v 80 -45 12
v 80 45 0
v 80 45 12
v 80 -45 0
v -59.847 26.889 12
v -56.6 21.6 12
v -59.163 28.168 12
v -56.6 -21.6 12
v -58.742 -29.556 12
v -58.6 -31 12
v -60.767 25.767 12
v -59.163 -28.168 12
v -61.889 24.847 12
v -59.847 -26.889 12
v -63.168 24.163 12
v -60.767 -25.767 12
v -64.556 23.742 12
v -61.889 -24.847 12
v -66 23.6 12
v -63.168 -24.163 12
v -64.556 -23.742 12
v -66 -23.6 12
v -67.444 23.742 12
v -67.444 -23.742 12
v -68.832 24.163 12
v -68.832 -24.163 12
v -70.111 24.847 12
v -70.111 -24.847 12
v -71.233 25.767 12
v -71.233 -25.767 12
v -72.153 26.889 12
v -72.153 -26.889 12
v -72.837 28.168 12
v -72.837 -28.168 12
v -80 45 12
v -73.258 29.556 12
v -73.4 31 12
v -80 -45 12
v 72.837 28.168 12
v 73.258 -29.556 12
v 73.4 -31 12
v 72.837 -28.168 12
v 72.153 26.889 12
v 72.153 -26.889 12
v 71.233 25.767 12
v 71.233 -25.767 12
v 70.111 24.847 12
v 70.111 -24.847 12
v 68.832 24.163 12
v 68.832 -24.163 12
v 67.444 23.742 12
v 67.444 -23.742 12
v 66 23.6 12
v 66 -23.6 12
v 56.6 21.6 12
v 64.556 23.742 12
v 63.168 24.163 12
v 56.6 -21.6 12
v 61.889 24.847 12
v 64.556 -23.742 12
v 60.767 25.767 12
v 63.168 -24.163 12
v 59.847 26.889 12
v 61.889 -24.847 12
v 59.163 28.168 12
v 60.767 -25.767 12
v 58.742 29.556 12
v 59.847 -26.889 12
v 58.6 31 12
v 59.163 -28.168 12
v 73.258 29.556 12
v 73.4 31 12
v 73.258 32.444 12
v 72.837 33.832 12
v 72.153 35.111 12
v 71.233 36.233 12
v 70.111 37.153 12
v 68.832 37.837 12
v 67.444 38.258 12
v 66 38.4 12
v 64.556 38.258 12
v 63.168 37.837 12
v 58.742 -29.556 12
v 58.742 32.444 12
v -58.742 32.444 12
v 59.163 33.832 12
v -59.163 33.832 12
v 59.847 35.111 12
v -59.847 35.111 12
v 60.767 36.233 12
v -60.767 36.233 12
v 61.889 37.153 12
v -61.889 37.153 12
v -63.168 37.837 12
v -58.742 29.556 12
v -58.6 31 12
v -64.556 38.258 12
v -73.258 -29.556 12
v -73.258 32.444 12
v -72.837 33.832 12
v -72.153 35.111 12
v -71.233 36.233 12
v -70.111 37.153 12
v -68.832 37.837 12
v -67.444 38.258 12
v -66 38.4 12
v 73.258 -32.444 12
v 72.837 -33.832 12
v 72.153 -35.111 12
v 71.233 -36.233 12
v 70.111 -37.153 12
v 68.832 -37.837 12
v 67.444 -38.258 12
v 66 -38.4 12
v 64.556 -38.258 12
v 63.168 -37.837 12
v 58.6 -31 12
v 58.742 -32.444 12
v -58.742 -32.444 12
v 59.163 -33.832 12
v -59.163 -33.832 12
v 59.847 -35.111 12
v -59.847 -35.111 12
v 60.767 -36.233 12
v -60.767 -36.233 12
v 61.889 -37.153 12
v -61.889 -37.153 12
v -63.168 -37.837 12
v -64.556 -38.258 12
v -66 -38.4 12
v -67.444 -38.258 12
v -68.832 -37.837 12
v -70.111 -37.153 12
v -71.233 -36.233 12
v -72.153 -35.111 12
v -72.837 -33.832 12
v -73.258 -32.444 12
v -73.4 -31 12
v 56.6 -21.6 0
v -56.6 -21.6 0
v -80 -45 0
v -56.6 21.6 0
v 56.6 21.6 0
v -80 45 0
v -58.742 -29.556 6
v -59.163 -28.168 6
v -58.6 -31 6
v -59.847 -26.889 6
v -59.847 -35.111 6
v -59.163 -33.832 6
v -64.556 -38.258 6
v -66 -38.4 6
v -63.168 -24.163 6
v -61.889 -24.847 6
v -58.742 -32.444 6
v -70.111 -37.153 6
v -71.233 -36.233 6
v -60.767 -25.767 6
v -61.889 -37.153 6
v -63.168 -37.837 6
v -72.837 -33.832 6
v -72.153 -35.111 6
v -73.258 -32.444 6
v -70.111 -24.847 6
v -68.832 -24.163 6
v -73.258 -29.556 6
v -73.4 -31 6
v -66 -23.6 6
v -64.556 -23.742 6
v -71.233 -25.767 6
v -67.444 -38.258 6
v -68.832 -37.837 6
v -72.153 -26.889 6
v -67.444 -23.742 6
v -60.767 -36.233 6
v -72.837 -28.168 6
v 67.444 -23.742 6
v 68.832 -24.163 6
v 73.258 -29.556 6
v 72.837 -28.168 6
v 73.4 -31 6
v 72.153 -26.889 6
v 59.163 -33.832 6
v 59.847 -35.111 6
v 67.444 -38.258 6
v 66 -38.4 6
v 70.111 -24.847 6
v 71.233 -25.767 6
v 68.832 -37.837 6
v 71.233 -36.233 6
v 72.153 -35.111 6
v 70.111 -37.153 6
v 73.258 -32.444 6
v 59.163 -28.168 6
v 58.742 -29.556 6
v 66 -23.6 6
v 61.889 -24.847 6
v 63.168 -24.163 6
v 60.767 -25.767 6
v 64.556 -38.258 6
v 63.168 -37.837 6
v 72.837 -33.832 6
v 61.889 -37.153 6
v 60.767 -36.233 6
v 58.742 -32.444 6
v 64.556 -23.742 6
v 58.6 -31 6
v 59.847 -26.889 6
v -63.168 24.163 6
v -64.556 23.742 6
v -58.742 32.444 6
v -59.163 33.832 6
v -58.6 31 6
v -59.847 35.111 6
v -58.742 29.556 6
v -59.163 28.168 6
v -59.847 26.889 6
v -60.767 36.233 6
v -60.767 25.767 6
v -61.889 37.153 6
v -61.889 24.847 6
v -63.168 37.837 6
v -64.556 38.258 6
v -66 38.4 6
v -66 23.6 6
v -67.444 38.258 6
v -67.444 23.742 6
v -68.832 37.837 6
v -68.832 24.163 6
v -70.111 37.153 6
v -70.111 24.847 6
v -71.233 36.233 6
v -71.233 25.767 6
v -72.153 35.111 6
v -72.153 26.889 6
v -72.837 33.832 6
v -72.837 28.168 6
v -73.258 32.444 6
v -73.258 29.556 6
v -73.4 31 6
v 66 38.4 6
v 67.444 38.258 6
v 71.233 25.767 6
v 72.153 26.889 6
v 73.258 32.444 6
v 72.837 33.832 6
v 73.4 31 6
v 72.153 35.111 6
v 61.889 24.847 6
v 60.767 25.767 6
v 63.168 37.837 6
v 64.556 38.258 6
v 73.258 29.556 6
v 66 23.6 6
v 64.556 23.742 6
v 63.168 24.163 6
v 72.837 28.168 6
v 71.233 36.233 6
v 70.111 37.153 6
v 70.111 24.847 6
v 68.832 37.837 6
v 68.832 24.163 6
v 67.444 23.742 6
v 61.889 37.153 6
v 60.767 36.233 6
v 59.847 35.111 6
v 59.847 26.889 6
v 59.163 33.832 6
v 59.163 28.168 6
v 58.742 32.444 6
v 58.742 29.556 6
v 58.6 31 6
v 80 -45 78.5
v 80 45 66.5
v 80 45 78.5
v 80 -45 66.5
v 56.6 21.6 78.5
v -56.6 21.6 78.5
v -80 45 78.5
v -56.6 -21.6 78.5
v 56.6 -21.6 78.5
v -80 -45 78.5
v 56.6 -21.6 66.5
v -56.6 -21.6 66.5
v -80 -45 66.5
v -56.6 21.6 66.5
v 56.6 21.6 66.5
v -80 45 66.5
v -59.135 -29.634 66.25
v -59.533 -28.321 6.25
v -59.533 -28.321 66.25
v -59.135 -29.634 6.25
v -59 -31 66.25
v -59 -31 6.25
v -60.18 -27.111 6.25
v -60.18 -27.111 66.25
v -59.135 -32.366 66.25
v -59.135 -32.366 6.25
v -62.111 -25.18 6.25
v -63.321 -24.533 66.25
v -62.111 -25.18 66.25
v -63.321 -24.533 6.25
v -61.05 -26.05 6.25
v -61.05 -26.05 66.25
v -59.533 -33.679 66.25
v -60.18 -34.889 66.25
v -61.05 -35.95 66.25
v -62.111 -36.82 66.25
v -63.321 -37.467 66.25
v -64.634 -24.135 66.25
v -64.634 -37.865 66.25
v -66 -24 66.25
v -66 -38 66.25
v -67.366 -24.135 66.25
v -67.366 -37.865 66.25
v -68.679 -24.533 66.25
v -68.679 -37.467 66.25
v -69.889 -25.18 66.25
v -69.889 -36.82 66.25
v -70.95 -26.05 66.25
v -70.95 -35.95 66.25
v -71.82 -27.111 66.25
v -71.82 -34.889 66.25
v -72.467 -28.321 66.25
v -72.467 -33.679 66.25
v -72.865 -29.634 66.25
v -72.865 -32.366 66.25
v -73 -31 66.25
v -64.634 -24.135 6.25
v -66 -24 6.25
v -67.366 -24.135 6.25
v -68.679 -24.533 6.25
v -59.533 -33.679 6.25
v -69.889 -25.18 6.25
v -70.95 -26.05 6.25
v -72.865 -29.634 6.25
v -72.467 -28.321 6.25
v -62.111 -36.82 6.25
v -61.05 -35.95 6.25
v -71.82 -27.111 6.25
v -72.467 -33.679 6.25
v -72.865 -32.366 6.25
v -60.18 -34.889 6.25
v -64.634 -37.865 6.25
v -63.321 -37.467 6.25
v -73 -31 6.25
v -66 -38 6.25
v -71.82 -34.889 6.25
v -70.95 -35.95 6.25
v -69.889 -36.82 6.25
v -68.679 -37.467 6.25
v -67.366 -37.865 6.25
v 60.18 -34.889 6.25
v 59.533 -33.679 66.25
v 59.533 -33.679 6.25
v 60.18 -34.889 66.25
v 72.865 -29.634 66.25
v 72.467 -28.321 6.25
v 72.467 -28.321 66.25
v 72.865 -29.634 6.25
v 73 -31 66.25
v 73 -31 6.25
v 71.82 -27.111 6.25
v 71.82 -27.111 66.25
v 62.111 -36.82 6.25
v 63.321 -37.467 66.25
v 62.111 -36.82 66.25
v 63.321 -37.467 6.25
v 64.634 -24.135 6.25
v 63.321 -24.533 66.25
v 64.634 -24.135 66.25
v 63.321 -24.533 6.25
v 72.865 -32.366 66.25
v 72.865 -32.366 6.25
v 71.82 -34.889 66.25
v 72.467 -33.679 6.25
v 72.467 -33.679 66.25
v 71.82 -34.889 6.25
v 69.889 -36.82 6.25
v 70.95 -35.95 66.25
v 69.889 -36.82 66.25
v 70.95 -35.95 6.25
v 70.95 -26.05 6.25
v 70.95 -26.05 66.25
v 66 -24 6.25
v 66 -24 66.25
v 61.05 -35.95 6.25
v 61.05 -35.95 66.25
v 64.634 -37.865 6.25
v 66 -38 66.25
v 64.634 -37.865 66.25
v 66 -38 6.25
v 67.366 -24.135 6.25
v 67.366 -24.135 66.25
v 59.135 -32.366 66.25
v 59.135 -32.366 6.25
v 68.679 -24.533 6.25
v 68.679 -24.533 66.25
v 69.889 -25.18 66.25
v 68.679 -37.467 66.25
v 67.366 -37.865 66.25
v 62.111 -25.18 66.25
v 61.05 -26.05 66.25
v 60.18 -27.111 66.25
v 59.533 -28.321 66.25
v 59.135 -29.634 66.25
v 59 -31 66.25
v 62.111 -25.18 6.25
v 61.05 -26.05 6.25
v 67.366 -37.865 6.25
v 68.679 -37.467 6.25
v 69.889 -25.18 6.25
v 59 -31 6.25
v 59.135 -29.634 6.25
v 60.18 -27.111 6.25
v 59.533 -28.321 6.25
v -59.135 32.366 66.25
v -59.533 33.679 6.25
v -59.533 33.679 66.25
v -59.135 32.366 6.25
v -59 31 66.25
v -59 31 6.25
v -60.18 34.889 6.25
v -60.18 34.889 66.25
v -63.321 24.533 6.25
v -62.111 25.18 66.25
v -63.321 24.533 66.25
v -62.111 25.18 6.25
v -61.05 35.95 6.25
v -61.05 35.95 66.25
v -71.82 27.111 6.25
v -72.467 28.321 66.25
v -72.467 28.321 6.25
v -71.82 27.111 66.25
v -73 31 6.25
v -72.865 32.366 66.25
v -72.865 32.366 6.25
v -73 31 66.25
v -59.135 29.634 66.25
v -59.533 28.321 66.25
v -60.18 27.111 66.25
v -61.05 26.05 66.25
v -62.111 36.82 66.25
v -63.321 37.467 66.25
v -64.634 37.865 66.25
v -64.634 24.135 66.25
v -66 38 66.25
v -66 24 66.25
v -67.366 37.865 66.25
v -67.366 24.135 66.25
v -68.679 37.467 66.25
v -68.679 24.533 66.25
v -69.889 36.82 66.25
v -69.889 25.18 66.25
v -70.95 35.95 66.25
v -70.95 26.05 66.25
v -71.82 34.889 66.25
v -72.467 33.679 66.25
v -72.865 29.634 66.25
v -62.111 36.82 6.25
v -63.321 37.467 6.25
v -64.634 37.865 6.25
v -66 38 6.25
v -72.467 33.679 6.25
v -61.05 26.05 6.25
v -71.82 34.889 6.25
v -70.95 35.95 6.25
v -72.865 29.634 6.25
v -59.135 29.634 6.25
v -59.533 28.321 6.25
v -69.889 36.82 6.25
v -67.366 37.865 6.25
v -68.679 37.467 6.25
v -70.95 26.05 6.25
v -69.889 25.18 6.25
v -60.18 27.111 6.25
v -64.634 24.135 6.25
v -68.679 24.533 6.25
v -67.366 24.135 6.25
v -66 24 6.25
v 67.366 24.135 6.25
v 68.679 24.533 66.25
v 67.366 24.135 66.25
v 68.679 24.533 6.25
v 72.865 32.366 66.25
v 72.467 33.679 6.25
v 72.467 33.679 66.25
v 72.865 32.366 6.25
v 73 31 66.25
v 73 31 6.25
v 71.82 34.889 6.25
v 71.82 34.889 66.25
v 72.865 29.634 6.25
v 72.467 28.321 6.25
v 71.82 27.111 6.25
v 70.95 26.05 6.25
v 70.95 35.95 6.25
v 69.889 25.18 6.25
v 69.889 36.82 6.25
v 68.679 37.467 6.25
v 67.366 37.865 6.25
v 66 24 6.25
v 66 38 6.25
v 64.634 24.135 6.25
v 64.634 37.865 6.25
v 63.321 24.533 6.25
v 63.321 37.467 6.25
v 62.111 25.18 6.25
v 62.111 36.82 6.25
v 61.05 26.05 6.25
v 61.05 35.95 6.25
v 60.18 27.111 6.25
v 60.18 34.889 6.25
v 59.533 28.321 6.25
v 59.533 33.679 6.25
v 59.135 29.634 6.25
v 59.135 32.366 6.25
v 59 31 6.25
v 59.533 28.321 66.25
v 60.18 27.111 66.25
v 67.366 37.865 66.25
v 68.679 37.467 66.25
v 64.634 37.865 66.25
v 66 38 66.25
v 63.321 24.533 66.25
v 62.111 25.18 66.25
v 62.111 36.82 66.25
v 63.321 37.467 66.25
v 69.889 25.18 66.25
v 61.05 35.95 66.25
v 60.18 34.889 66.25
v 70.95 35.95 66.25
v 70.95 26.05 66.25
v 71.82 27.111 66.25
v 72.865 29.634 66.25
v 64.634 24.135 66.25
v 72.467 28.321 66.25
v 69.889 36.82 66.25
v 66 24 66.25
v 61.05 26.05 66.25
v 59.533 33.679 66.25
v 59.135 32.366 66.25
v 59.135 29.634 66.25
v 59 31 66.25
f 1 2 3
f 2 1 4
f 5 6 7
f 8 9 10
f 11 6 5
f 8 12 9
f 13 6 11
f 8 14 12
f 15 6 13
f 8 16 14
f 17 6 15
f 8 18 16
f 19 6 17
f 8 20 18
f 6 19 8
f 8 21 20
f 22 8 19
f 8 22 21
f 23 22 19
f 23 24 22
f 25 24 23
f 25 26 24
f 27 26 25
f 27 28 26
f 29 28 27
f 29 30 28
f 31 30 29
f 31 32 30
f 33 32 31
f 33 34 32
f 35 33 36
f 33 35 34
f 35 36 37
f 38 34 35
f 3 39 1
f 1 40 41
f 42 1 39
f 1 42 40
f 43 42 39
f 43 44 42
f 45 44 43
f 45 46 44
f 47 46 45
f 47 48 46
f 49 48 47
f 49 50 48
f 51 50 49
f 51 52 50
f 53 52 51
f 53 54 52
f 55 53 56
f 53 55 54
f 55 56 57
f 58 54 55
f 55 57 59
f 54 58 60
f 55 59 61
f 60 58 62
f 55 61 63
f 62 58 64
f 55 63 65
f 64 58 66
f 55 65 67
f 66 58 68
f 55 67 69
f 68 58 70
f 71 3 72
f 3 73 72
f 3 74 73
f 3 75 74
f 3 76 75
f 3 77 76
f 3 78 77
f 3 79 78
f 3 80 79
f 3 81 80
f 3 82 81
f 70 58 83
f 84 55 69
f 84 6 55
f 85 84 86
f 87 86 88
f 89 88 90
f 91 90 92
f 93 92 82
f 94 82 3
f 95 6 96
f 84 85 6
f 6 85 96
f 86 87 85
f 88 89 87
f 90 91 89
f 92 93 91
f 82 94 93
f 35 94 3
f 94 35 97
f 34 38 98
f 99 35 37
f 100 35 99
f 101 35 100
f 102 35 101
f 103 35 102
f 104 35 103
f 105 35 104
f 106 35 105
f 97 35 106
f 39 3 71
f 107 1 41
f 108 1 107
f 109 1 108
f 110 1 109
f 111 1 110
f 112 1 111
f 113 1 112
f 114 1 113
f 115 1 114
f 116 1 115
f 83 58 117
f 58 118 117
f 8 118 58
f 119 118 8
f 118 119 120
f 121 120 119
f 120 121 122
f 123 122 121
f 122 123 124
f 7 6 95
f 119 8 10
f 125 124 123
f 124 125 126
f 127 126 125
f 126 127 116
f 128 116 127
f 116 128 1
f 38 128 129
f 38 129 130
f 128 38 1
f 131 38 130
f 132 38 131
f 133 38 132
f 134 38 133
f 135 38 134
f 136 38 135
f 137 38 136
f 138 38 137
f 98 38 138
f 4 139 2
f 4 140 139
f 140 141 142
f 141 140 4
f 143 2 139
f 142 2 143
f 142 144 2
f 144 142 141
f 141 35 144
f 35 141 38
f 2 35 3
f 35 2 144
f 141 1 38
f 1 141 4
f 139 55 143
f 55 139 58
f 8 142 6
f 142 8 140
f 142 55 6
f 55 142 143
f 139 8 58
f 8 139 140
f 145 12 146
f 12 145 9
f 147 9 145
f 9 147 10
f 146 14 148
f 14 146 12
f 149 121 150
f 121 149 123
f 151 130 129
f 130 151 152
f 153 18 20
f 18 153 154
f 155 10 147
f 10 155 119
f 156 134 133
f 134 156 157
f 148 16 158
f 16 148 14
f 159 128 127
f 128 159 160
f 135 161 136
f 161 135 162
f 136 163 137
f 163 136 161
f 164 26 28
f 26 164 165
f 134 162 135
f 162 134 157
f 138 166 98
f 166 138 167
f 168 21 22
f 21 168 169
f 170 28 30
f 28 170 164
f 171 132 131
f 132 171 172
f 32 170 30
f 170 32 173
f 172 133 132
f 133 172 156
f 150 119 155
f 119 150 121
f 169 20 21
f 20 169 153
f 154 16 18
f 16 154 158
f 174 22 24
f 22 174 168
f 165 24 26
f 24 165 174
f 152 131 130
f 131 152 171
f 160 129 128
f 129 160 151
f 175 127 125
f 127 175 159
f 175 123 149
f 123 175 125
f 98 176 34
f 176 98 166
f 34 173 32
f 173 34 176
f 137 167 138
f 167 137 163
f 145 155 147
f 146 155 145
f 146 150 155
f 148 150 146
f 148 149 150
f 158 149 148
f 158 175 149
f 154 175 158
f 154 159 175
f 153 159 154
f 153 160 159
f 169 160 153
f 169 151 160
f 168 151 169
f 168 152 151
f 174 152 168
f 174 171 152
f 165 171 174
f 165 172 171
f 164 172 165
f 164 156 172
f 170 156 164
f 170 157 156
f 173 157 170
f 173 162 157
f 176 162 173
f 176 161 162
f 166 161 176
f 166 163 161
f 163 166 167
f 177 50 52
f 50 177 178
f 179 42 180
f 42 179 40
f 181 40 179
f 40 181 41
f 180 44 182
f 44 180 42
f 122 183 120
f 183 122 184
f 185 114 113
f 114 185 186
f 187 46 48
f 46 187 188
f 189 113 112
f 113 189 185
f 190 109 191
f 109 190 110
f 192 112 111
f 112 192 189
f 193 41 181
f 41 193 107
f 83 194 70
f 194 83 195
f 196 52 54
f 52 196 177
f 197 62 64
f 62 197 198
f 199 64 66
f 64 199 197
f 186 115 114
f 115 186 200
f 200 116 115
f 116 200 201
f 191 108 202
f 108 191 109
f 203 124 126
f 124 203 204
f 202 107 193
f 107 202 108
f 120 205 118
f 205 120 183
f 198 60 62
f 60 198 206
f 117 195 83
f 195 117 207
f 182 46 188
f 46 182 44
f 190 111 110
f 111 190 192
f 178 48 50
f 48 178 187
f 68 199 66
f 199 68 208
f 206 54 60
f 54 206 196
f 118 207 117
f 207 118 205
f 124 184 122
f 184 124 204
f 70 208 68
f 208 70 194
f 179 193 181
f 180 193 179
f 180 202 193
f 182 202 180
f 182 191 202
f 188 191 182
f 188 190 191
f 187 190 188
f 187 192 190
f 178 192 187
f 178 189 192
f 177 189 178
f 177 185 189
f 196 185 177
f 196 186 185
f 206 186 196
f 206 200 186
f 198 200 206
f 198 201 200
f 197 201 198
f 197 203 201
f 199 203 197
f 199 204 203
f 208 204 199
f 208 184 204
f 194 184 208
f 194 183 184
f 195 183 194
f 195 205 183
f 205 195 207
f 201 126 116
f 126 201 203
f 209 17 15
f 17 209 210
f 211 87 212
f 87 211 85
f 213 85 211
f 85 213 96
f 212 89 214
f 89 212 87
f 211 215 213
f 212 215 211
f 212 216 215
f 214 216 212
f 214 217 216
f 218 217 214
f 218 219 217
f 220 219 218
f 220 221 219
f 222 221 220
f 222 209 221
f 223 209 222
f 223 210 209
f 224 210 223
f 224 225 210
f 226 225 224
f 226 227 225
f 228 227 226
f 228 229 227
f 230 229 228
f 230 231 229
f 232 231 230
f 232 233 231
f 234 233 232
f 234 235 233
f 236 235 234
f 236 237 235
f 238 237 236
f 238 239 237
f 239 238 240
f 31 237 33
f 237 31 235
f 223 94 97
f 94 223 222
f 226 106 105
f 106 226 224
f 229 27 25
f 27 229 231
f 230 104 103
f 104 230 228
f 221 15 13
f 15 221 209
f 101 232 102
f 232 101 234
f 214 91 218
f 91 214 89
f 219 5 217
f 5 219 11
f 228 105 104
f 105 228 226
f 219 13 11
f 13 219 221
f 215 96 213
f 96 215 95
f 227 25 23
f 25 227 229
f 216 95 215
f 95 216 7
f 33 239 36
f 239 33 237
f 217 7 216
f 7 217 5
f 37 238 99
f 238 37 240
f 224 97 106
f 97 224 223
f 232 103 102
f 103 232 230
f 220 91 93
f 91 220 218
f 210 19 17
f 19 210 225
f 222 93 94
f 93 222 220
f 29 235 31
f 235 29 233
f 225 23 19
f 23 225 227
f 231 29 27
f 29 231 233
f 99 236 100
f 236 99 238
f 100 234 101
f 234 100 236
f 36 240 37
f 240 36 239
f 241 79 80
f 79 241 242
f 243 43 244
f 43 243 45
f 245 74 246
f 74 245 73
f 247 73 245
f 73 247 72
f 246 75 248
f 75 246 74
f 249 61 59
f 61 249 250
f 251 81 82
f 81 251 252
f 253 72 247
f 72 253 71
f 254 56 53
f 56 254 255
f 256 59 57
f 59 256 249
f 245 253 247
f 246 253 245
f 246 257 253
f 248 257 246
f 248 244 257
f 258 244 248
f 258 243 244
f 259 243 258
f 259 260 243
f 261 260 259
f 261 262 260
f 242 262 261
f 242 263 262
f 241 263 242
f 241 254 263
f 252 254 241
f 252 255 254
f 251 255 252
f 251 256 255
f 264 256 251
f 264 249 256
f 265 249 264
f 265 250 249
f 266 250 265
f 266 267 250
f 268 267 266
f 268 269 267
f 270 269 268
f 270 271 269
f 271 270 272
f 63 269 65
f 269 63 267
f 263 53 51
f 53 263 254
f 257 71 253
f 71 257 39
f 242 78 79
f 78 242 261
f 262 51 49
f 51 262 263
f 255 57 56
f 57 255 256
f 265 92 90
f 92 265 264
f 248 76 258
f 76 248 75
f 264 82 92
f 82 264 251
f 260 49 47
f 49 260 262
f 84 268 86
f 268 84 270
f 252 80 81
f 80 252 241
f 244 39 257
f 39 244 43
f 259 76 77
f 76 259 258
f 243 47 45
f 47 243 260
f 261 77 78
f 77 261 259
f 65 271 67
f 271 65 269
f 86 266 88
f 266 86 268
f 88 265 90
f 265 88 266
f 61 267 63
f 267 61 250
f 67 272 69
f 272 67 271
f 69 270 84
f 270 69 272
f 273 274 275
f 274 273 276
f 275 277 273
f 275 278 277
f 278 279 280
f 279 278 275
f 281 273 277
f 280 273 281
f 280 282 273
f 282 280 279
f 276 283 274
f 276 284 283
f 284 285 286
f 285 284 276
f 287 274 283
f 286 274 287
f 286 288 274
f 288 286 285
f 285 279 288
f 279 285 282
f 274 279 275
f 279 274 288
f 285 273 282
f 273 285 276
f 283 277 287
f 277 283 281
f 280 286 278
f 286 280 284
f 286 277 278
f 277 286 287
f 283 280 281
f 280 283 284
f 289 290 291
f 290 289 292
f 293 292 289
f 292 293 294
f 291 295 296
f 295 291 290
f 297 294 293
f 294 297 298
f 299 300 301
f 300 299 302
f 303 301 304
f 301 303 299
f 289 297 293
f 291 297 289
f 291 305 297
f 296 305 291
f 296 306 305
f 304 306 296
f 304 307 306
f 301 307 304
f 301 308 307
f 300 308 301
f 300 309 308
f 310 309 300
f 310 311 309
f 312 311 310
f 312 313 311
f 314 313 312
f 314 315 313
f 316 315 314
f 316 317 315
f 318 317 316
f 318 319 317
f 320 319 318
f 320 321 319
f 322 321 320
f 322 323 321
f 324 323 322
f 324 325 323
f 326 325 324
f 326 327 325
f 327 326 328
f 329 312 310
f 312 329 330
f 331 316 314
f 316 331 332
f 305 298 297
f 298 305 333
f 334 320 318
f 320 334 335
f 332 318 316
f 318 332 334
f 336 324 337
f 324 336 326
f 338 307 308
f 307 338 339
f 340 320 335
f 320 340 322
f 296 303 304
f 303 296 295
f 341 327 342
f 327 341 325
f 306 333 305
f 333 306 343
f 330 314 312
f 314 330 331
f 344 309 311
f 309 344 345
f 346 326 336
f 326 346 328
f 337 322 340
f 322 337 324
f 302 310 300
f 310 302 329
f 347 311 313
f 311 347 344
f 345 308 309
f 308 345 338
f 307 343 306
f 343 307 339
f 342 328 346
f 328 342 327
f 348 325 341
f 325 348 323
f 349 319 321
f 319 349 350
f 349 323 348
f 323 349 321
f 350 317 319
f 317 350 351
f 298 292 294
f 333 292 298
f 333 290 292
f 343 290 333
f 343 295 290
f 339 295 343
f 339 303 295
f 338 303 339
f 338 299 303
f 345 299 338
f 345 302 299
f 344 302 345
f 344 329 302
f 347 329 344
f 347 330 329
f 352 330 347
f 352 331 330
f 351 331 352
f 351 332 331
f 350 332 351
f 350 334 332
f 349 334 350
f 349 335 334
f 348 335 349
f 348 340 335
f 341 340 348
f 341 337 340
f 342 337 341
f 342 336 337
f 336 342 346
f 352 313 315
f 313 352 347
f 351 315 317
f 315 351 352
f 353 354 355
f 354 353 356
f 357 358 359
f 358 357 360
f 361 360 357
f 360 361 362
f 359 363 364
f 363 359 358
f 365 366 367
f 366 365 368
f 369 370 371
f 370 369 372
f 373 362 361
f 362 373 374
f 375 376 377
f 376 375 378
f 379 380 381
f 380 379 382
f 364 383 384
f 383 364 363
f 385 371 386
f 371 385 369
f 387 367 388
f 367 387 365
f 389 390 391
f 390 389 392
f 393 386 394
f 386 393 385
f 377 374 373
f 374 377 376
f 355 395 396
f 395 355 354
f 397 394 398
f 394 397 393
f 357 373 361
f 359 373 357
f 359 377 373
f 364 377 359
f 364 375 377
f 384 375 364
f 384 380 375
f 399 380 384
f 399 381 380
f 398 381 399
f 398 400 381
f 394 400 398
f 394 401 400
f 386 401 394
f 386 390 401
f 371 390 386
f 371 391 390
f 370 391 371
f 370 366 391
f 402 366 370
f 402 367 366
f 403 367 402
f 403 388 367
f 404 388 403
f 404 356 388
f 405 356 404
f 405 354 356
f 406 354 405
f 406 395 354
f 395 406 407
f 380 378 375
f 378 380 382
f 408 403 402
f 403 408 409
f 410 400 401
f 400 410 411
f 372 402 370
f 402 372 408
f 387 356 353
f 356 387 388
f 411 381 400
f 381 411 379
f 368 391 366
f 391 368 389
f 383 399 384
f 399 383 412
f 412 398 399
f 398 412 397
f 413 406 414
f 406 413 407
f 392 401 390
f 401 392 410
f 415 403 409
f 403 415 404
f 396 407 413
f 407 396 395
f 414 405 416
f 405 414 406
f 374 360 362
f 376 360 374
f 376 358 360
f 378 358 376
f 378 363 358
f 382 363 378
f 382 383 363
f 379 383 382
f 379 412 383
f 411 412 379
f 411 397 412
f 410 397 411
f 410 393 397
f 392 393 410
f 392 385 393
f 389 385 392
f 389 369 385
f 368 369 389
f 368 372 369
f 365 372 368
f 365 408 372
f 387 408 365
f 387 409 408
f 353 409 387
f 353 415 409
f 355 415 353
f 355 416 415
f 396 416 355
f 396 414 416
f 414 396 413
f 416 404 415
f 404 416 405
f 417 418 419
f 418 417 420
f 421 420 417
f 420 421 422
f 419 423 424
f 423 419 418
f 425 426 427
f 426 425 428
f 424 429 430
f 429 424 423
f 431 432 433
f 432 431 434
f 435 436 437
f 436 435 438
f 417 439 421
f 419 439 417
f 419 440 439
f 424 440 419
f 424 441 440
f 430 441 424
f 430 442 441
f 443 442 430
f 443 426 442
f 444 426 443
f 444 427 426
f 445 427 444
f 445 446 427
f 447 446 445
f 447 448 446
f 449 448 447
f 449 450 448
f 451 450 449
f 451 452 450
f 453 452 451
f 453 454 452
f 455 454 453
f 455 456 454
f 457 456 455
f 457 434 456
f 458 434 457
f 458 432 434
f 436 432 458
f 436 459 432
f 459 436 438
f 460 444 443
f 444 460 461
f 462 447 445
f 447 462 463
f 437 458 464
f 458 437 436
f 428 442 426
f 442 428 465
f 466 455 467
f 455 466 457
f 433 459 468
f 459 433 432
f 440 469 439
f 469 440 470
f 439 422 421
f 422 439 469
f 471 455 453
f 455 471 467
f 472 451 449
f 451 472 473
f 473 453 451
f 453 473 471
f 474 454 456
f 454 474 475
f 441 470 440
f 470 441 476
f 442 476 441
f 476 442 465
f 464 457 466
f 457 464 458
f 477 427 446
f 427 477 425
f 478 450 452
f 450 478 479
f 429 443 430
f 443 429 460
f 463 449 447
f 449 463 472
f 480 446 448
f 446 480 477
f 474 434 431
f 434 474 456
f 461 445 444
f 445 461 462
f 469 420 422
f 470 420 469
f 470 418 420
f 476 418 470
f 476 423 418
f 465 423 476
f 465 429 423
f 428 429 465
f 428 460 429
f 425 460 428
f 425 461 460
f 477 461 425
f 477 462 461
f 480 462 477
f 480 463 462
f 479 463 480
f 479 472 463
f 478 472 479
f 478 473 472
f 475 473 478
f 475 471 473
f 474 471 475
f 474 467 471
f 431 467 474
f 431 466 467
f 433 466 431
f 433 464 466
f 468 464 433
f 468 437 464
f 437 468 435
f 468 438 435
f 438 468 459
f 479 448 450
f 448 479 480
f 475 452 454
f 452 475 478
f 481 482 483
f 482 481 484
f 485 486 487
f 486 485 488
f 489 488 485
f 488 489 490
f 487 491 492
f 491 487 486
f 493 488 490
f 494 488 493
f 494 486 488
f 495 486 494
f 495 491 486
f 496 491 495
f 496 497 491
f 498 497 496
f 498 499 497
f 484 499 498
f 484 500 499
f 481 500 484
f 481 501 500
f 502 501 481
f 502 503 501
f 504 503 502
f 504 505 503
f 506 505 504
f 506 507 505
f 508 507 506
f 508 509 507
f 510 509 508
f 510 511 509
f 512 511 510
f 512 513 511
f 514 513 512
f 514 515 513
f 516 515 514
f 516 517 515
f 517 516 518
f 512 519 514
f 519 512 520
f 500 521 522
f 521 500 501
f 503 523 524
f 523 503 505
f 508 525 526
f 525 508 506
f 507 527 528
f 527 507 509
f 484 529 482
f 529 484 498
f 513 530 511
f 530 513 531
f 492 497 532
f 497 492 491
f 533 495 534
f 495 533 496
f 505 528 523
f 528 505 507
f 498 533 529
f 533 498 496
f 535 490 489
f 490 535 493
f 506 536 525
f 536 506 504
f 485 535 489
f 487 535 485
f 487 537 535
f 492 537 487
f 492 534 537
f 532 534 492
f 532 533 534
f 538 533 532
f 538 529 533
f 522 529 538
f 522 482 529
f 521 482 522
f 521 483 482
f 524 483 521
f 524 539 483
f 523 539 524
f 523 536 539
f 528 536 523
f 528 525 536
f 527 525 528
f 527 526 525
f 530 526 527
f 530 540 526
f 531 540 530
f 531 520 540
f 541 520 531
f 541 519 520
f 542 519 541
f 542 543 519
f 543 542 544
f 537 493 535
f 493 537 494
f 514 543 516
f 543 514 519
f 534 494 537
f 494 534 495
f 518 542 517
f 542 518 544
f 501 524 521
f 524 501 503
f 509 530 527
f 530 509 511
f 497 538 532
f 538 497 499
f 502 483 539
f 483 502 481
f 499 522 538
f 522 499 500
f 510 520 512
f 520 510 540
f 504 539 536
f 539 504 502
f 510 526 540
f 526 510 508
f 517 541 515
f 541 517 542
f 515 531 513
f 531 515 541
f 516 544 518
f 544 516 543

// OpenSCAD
$fn = 32;

// ------------------------------------------------------------------------
// Frame cube: base 160 x 90 mm, posts 60 mm tall
// Every part is its own module, assembly() places every instance.
// ------------------------------------------------------------------------

// --- part 1 ---
module base_frame() {
  difference() {
    translate([-80, -45, 0]) cube([160, 90, 12]);
    translate([-56.6, -21.6, -1]) cube([113.2, 43.2, 14]);
    translate([-66, -31, 6]) cylinder(h = 7, d = 14.8);
    translate([66, -31, 6]) cylinder(h = 7, d = 14.8);
    translate([-66, 31, 6]) cylinder(h = 7, d = 14.8);
    translate([66, 31, 6]) cylinder(h = 7, d = 14.8);
  }
}

// --- part 2 ---
module corner_post() {
  cylinder(h = 60, d = 14);
}

// --- part 3 ---
module top_frame() {
  difference() {
    translate([-80, -45, 0]) cube([160, 90, 12]);
    translate([-56.6, -21.6, -1]) cube([113.2, 43.2, 14]);
  }
}

// --- assembly ---
module assembly() {
  color([0.80, 0.24, 0.20]) translate([0, 0, 0]) rotate([0, 0, 0]) base_frame();
  color([0.20, 0.45, 0.75]) translate([-66, -31, 6.25]) rotate([0, 0, 0]) corner_post();
  color([0.25, 0.62, 0.32]) translate([66, -31, 6.25]) rotate([0, 0, 0]) corner_post();
  color([0.92, 0.70, 0.18]) translate([-66, 31, 6.25]) rotate([0, 0, 0]) corner_post();
  color([0.58, 0.35, 0.70]) translate([66, 31, 6.25]) rotate([0, 0, 0]) corner_post();
  color([0.16, 0.66, 0.66]) translate([0, 0, 66.5]) rotate([0, 0, 0]) top_frame();
}

assembly();
